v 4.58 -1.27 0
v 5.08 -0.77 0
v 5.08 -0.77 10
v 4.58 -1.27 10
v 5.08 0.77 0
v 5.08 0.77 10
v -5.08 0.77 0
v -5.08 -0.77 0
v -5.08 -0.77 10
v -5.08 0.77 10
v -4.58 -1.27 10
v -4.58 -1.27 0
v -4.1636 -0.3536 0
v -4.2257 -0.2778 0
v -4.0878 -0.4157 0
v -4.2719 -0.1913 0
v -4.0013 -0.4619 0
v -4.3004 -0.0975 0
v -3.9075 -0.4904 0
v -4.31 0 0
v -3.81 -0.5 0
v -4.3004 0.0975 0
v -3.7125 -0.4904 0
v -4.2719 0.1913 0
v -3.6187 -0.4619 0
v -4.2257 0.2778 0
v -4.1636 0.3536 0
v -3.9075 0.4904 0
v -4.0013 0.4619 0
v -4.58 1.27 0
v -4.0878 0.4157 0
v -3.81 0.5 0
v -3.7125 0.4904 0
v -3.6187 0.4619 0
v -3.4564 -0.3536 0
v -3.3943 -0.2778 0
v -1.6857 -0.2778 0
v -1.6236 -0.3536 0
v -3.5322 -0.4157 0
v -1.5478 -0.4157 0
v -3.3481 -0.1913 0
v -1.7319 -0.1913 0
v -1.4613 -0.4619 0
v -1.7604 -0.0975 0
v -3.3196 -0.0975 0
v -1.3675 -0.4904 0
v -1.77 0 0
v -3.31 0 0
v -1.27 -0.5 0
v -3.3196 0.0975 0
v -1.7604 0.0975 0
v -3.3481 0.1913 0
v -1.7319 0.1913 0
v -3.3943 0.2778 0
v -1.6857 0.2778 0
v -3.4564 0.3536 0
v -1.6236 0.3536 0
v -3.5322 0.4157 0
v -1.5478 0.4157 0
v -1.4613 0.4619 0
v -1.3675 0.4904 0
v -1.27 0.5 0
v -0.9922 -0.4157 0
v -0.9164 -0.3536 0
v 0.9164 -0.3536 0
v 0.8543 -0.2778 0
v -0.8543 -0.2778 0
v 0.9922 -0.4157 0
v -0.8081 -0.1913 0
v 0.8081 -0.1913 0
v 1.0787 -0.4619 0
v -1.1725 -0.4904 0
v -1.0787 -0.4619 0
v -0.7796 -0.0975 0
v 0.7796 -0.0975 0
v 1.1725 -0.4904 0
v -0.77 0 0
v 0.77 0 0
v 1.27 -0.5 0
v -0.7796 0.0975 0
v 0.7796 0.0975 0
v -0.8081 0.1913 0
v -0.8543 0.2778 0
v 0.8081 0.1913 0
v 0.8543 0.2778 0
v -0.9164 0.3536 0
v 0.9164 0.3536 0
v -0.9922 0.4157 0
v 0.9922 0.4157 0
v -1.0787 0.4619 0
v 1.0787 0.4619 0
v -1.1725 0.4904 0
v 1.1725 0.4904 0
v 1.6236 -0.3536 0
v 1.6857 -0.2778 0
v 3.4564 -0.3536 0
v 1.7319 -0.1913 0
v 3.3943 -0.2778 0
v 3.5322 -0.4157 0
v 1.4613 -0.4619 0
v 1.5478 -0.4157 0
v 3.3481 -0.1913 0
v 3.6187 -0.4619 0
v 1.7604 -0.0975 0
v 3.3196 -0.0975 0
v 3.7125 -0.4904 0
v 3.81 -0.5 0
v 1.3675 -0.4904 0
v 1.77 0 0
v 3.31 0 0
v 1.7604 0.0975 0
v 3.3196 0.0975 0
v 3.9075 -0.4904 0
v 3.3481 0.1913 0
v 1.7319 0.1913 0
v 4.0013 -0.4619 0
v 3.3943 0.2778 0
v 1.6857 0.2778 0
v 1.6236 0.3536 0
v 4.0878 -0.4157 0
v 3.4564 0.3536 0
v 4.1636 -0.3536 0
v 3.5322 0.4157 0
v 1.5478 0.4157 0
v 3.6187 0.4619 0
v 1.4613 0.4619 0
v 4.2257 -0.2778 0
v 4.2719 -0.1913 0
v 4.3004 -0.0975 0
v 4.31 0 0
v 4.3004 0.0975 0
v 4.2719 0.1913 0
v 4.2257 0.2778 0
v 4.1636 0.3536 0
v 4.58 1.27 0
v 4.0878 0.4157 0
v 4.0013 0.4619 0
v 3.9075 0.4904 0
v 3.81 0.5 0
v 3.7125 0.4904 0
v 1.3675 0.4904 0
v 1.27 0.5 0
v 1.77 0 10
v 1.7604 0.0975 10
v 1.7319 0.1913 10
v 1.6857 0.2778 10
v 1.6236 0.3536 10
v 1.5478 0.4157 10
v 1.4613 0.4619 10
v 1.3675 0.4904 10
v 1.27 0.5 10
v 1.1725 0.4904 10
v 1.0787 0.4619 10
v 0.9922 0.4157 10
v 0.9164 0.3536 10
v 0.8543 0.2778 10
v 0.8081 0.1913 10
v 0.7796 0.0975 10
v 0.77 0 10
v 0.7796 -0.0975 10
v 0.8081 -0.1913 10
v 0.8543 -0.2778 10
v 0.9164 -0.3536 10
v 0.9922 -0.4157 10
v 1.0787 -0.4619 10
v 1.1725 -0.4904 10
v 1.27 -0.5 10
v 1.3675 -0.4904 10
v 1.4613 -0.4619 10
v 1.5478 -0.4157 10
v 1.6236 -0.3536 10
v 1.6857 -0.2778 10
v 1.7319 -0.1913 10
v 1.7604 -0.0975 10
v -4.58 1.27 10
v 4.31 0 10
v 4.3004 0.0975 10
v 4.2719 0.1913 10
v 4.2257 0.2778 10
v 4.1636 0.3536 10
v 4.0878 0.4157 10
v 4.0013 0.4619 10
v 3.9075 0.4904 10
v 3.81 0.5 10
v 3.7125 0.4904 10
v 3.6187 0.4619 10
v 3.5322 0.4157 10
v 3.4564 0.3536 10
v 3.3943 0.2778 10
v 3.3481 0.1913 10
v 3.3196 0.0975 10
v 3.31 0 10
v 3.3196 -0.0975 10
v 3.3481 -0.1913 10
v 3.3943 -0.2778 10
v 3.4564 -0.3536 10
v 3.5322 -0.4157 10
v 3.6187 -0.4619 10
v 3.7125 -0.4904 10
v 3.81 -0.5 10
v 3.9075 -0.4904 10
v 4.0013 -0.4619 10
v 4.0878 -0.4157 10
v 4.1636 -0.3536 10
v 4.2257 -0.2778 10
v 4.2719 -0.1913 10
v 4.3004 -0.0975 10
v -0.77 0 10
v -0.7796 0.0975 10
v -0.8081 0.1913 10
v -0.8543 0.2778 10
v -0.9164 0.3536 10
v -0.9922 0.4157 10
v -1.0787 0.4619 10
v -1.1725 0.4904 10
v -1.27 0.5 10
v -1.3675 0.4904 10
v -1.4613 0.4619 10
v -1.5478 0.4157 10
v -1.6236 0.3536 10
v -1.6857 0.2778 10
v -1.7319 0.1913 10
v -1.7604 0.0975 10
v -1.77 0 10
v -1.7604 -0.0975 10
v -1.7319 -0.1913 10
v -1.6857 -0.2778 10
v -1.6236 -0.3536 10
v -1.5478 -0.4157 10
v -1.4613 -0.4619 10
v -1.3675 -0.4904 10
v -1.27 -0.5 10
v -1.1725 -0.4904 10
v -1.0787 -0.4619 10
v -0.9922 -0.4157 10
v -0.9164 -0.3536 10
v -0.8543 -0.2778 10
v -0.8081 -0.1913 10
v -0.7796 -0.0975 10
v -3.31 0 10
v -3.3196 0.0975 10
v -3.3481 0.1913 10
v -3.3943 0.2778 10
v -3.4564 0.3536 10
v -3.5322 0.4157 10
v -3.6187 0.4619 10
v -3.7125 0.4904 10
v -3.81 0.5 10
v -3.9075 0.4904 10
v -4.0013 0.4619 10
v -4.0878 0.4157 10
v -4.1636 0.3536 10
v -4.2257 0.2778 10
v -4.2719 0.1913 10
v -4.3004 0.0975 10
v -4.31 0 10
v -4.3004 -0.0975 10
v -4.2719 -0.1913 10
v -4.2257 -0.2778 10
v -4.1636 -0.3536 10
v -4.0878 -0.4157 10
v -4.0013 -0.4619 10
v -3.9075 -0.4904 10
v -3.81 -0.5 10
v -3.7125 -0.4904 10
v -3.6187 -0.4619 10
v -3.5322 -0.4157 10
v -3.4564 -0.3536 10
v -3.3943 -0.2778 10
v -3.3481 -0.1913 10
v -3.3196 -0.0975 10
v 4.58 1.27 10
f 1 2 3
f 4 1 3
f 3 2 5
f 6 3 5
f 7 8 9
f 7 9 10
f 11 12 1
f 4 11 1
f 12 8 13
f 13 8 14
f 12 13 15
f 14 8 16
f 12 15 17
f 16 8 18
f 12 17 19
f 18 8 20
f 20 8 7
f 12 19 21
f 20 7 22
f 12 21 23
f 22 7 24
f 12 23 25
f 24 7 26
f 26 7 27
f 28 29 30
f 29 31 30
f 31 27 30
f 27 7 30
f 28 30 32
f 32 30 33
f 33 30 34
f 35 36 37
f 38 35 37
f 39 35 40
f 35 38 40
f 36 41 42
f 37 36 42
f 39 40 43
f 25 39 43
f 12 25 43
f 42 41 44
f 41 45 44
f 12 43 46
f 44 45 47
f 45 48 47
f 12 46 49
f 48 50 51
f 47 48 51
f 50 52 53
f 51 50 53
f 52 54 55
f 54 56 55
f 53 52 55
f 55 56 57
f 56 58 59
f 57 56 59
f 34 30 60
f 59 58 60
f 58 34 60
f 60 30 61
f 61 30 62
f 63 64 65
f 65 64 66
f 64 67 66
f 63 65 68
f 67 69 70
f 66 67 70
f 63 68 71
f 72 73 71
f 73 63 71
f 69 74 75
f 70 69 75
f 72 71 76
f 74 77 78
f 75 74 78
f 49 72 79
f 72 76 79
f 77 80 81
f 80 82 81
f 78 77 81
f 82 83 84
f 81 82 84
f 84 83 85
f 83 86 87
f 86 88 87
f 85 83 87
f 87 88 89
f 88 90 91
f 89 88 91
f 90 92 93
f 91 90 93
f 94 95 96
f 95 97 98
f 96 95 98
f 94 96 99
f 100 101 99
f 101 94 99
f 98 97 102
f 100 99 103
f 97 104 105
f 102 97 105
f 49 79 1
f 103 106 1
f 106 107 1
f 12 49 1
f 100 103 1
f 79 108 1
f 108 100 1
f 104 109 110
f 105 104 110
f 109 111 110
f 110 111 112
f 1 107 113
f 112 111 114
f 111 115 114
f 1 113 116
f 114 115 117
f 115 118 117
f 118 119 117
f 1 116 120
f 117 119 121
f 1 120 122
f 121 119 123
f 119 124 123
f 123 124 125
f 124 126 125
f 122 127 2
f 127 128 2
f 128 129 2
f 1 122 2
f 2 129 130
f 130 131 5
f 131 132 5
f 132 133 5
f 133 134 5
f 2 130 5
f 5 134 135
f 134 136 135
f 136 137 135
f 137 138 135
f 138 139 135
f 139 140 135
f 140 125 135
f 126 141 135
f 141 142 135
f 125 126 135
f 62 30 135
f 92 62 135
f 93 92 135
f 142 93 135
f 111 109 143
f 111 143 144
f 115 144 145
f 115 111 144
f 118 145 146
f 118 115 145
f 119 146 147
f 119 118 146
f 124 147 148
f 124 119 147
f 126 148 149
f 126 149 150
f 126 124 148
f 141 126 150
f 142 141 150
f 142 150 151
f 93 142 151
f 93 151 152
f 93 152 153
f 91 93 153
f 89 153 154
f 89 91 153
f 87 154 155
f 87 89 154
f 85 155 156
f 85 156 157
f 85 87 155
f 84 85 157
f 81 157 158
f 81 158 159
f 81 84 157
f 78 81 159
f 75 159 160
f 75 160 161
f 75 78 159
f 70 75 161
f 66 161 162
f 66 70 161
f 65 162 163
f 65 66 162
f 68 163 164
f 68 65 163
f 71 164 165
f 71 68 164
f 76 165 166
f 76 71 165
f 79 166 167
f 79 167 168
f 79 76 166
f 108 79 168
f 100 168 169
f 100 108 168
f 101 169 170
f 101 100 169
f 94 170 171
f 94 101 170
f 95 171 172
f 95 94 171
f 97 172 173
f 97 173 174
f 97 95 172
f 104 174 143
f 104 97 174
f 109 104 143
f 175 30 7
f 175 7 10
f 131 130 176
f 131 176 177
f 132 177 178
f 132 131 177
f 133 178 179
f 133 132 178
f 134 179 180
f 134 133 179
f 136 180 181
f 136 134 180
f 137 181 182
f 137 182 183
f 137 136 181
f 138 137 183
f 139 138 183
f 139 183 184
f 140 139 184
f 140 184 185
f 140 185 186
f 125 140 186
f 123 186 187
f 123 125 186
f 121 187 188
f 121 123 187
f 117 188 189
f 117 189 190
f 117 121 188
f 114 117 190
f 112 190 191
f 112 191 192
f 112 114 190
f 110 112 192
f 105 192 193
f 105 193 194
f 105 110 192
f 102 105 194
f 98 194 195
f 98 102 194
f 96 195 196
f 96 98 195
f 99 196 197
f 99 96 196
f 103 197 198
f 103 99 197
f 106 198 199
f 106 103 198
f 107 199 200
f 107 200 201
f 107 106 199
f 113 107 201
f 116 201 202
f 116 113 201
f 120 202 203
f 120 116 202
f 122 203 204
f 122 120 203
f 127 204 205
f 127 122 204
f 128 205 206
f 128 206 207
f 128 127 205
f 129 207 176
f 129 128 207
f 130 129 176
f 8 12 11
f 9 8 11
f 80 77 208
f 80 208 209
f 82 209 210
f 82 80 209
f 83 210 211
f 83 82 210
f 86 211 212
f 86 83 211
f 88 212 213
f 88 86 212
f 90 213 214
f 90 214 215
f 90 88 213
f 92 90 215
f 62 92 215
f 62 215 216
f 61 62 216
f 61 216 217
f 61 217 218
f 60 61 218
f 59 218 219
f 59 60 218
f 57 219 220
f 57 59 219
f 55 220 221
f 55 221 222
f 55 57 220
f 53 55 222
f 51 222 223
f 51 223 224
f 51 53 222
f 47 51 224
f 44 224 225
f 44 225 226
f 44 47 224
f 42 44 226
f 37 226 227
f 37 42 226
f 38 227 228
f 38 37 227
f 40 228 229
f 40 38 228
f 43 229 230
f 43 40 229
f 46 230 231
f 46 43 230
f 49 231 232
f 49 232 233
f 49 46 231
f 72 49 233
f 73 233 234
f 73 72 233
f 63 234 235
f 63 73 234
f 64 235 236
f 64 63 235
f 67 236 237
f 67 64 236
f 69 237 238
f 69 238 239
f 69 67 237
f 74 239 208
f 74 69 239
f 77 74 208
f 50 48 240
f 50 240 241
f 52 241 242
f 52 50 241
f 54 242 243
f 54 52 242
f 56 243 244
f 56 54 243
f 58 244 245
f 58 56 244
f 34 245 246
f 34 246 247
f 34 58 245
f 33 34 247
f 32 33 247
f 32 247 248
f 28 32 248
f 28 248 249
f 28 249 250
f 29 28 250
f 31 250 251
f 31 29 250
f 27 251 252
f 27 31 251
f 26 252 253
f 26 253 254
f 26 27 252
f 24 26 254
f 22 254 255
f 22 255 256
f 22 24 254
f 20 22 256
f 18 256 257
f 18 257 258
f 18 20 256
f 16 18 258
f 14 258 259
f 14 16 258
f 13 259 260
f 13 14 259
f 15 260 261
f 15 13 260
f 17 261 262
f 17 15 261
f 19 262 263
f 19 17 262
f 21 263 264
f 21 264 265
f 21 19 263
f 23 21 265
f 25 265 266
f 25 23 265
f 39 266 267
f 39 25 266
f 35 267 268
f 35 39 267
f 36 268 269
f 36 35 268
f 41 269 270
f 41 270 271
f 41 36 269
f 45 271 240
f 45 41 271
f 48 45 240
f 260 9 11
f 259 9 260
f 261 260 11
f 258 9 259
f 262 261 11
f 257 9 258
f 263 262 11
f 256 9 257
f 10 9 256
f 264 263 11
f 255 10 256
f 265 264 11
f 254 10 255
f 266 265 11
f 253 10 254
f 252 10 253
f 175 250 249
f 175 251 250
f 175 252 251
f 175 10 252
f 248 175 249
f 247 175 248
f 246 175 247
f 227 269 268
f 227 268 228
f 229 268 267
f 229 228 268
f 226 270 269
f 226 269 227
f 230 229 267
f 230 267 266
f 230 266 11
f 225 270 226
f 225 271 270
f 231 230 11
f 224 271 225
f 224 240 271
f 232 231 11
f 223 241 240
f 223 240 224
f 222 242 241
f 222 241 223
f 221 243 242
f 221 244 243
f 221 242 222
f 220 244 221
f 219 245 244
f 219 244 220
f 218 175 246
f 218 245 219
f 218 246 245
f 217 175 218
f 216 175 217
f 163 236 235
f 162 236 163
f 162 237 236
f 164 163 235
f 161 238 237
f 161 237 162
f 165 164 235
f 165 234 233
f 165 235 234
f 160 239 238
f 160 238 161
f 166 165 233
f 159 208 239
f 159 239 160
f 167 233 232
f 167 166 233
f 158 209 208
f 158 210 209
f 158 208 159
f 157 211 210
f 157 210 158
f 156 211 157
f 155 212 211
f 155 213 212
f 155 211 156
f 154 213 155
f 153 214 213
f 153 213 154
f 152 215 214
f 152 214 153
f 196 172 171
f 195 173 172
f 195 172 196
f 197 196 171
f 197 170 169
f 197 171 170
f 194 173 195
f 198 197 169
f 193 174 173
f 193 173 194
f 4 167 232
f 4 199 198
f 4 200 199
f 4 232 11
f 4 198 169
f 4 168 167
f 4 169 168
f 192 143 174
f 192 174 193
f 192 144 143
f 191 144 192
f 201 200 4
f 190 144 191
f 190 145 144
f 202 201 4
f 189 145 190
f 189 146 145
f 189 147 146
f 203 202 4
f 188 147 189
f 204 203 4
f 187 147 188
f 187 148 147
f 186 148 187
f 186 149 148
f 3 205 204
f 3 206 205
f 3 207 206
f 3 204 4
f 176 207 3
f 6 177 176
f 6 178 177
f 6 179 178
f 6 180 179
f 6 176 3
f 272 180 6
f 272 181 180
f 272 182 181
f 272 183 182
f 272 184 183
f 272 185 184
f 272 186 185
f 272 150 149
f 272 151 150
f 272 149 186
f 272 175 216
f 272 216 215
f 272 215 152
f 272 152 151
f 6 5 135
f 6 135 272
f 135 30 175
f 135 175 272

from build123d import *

# Parameters (mm, degrees)
SKETCH_2_W      = 10.16
SKETCH_2_H      = 2.54
SKETCH_2_R      = 0.5
EXTRUDE_1_DEPTH = 10
CHAMFER_2_SIZE  = 0.5


with BuildPart() as part:
    # Эскиз2 → Бобышка-Вытянуть1 (new body)
    with BuildSketch(Plane.XY):
        Rectangle(SKETCH_2_W, SKETCH_2_H)
        with Locations((-3.81, 0)):
            Circle(SKETCH_2_R, mode=Mode.SUBTRACT)
        with Locations((-1.27, 0)):
            Circle(SKETCH_2_R, mode=Mode.SUBTRACT)
        with Locations((1.27, 0)):
            Circle(SKETCH_2_R, mode=Mode.SUBTRACT)
        with Locations((3.81, 0)):
            Circle(SKETCH_2_R, mode=Mode.SUBTRACT)
    extrude(amount=EXTRUDE_1_DEPTH)

    # Фаска2
    chamfer_2_edges = [part.edges().sort_by_distance(p)[0] for p in [
        (5.08, -1.27, 5),
        (-5.08, -1.27, 5),
        (-5.08, 1.27, 5),
        (5.08, 1.27, 5),
    ]]
    chamfer(chamfer_2_edges, length=CHAMFER_2_SIZE)


solid = part.part
